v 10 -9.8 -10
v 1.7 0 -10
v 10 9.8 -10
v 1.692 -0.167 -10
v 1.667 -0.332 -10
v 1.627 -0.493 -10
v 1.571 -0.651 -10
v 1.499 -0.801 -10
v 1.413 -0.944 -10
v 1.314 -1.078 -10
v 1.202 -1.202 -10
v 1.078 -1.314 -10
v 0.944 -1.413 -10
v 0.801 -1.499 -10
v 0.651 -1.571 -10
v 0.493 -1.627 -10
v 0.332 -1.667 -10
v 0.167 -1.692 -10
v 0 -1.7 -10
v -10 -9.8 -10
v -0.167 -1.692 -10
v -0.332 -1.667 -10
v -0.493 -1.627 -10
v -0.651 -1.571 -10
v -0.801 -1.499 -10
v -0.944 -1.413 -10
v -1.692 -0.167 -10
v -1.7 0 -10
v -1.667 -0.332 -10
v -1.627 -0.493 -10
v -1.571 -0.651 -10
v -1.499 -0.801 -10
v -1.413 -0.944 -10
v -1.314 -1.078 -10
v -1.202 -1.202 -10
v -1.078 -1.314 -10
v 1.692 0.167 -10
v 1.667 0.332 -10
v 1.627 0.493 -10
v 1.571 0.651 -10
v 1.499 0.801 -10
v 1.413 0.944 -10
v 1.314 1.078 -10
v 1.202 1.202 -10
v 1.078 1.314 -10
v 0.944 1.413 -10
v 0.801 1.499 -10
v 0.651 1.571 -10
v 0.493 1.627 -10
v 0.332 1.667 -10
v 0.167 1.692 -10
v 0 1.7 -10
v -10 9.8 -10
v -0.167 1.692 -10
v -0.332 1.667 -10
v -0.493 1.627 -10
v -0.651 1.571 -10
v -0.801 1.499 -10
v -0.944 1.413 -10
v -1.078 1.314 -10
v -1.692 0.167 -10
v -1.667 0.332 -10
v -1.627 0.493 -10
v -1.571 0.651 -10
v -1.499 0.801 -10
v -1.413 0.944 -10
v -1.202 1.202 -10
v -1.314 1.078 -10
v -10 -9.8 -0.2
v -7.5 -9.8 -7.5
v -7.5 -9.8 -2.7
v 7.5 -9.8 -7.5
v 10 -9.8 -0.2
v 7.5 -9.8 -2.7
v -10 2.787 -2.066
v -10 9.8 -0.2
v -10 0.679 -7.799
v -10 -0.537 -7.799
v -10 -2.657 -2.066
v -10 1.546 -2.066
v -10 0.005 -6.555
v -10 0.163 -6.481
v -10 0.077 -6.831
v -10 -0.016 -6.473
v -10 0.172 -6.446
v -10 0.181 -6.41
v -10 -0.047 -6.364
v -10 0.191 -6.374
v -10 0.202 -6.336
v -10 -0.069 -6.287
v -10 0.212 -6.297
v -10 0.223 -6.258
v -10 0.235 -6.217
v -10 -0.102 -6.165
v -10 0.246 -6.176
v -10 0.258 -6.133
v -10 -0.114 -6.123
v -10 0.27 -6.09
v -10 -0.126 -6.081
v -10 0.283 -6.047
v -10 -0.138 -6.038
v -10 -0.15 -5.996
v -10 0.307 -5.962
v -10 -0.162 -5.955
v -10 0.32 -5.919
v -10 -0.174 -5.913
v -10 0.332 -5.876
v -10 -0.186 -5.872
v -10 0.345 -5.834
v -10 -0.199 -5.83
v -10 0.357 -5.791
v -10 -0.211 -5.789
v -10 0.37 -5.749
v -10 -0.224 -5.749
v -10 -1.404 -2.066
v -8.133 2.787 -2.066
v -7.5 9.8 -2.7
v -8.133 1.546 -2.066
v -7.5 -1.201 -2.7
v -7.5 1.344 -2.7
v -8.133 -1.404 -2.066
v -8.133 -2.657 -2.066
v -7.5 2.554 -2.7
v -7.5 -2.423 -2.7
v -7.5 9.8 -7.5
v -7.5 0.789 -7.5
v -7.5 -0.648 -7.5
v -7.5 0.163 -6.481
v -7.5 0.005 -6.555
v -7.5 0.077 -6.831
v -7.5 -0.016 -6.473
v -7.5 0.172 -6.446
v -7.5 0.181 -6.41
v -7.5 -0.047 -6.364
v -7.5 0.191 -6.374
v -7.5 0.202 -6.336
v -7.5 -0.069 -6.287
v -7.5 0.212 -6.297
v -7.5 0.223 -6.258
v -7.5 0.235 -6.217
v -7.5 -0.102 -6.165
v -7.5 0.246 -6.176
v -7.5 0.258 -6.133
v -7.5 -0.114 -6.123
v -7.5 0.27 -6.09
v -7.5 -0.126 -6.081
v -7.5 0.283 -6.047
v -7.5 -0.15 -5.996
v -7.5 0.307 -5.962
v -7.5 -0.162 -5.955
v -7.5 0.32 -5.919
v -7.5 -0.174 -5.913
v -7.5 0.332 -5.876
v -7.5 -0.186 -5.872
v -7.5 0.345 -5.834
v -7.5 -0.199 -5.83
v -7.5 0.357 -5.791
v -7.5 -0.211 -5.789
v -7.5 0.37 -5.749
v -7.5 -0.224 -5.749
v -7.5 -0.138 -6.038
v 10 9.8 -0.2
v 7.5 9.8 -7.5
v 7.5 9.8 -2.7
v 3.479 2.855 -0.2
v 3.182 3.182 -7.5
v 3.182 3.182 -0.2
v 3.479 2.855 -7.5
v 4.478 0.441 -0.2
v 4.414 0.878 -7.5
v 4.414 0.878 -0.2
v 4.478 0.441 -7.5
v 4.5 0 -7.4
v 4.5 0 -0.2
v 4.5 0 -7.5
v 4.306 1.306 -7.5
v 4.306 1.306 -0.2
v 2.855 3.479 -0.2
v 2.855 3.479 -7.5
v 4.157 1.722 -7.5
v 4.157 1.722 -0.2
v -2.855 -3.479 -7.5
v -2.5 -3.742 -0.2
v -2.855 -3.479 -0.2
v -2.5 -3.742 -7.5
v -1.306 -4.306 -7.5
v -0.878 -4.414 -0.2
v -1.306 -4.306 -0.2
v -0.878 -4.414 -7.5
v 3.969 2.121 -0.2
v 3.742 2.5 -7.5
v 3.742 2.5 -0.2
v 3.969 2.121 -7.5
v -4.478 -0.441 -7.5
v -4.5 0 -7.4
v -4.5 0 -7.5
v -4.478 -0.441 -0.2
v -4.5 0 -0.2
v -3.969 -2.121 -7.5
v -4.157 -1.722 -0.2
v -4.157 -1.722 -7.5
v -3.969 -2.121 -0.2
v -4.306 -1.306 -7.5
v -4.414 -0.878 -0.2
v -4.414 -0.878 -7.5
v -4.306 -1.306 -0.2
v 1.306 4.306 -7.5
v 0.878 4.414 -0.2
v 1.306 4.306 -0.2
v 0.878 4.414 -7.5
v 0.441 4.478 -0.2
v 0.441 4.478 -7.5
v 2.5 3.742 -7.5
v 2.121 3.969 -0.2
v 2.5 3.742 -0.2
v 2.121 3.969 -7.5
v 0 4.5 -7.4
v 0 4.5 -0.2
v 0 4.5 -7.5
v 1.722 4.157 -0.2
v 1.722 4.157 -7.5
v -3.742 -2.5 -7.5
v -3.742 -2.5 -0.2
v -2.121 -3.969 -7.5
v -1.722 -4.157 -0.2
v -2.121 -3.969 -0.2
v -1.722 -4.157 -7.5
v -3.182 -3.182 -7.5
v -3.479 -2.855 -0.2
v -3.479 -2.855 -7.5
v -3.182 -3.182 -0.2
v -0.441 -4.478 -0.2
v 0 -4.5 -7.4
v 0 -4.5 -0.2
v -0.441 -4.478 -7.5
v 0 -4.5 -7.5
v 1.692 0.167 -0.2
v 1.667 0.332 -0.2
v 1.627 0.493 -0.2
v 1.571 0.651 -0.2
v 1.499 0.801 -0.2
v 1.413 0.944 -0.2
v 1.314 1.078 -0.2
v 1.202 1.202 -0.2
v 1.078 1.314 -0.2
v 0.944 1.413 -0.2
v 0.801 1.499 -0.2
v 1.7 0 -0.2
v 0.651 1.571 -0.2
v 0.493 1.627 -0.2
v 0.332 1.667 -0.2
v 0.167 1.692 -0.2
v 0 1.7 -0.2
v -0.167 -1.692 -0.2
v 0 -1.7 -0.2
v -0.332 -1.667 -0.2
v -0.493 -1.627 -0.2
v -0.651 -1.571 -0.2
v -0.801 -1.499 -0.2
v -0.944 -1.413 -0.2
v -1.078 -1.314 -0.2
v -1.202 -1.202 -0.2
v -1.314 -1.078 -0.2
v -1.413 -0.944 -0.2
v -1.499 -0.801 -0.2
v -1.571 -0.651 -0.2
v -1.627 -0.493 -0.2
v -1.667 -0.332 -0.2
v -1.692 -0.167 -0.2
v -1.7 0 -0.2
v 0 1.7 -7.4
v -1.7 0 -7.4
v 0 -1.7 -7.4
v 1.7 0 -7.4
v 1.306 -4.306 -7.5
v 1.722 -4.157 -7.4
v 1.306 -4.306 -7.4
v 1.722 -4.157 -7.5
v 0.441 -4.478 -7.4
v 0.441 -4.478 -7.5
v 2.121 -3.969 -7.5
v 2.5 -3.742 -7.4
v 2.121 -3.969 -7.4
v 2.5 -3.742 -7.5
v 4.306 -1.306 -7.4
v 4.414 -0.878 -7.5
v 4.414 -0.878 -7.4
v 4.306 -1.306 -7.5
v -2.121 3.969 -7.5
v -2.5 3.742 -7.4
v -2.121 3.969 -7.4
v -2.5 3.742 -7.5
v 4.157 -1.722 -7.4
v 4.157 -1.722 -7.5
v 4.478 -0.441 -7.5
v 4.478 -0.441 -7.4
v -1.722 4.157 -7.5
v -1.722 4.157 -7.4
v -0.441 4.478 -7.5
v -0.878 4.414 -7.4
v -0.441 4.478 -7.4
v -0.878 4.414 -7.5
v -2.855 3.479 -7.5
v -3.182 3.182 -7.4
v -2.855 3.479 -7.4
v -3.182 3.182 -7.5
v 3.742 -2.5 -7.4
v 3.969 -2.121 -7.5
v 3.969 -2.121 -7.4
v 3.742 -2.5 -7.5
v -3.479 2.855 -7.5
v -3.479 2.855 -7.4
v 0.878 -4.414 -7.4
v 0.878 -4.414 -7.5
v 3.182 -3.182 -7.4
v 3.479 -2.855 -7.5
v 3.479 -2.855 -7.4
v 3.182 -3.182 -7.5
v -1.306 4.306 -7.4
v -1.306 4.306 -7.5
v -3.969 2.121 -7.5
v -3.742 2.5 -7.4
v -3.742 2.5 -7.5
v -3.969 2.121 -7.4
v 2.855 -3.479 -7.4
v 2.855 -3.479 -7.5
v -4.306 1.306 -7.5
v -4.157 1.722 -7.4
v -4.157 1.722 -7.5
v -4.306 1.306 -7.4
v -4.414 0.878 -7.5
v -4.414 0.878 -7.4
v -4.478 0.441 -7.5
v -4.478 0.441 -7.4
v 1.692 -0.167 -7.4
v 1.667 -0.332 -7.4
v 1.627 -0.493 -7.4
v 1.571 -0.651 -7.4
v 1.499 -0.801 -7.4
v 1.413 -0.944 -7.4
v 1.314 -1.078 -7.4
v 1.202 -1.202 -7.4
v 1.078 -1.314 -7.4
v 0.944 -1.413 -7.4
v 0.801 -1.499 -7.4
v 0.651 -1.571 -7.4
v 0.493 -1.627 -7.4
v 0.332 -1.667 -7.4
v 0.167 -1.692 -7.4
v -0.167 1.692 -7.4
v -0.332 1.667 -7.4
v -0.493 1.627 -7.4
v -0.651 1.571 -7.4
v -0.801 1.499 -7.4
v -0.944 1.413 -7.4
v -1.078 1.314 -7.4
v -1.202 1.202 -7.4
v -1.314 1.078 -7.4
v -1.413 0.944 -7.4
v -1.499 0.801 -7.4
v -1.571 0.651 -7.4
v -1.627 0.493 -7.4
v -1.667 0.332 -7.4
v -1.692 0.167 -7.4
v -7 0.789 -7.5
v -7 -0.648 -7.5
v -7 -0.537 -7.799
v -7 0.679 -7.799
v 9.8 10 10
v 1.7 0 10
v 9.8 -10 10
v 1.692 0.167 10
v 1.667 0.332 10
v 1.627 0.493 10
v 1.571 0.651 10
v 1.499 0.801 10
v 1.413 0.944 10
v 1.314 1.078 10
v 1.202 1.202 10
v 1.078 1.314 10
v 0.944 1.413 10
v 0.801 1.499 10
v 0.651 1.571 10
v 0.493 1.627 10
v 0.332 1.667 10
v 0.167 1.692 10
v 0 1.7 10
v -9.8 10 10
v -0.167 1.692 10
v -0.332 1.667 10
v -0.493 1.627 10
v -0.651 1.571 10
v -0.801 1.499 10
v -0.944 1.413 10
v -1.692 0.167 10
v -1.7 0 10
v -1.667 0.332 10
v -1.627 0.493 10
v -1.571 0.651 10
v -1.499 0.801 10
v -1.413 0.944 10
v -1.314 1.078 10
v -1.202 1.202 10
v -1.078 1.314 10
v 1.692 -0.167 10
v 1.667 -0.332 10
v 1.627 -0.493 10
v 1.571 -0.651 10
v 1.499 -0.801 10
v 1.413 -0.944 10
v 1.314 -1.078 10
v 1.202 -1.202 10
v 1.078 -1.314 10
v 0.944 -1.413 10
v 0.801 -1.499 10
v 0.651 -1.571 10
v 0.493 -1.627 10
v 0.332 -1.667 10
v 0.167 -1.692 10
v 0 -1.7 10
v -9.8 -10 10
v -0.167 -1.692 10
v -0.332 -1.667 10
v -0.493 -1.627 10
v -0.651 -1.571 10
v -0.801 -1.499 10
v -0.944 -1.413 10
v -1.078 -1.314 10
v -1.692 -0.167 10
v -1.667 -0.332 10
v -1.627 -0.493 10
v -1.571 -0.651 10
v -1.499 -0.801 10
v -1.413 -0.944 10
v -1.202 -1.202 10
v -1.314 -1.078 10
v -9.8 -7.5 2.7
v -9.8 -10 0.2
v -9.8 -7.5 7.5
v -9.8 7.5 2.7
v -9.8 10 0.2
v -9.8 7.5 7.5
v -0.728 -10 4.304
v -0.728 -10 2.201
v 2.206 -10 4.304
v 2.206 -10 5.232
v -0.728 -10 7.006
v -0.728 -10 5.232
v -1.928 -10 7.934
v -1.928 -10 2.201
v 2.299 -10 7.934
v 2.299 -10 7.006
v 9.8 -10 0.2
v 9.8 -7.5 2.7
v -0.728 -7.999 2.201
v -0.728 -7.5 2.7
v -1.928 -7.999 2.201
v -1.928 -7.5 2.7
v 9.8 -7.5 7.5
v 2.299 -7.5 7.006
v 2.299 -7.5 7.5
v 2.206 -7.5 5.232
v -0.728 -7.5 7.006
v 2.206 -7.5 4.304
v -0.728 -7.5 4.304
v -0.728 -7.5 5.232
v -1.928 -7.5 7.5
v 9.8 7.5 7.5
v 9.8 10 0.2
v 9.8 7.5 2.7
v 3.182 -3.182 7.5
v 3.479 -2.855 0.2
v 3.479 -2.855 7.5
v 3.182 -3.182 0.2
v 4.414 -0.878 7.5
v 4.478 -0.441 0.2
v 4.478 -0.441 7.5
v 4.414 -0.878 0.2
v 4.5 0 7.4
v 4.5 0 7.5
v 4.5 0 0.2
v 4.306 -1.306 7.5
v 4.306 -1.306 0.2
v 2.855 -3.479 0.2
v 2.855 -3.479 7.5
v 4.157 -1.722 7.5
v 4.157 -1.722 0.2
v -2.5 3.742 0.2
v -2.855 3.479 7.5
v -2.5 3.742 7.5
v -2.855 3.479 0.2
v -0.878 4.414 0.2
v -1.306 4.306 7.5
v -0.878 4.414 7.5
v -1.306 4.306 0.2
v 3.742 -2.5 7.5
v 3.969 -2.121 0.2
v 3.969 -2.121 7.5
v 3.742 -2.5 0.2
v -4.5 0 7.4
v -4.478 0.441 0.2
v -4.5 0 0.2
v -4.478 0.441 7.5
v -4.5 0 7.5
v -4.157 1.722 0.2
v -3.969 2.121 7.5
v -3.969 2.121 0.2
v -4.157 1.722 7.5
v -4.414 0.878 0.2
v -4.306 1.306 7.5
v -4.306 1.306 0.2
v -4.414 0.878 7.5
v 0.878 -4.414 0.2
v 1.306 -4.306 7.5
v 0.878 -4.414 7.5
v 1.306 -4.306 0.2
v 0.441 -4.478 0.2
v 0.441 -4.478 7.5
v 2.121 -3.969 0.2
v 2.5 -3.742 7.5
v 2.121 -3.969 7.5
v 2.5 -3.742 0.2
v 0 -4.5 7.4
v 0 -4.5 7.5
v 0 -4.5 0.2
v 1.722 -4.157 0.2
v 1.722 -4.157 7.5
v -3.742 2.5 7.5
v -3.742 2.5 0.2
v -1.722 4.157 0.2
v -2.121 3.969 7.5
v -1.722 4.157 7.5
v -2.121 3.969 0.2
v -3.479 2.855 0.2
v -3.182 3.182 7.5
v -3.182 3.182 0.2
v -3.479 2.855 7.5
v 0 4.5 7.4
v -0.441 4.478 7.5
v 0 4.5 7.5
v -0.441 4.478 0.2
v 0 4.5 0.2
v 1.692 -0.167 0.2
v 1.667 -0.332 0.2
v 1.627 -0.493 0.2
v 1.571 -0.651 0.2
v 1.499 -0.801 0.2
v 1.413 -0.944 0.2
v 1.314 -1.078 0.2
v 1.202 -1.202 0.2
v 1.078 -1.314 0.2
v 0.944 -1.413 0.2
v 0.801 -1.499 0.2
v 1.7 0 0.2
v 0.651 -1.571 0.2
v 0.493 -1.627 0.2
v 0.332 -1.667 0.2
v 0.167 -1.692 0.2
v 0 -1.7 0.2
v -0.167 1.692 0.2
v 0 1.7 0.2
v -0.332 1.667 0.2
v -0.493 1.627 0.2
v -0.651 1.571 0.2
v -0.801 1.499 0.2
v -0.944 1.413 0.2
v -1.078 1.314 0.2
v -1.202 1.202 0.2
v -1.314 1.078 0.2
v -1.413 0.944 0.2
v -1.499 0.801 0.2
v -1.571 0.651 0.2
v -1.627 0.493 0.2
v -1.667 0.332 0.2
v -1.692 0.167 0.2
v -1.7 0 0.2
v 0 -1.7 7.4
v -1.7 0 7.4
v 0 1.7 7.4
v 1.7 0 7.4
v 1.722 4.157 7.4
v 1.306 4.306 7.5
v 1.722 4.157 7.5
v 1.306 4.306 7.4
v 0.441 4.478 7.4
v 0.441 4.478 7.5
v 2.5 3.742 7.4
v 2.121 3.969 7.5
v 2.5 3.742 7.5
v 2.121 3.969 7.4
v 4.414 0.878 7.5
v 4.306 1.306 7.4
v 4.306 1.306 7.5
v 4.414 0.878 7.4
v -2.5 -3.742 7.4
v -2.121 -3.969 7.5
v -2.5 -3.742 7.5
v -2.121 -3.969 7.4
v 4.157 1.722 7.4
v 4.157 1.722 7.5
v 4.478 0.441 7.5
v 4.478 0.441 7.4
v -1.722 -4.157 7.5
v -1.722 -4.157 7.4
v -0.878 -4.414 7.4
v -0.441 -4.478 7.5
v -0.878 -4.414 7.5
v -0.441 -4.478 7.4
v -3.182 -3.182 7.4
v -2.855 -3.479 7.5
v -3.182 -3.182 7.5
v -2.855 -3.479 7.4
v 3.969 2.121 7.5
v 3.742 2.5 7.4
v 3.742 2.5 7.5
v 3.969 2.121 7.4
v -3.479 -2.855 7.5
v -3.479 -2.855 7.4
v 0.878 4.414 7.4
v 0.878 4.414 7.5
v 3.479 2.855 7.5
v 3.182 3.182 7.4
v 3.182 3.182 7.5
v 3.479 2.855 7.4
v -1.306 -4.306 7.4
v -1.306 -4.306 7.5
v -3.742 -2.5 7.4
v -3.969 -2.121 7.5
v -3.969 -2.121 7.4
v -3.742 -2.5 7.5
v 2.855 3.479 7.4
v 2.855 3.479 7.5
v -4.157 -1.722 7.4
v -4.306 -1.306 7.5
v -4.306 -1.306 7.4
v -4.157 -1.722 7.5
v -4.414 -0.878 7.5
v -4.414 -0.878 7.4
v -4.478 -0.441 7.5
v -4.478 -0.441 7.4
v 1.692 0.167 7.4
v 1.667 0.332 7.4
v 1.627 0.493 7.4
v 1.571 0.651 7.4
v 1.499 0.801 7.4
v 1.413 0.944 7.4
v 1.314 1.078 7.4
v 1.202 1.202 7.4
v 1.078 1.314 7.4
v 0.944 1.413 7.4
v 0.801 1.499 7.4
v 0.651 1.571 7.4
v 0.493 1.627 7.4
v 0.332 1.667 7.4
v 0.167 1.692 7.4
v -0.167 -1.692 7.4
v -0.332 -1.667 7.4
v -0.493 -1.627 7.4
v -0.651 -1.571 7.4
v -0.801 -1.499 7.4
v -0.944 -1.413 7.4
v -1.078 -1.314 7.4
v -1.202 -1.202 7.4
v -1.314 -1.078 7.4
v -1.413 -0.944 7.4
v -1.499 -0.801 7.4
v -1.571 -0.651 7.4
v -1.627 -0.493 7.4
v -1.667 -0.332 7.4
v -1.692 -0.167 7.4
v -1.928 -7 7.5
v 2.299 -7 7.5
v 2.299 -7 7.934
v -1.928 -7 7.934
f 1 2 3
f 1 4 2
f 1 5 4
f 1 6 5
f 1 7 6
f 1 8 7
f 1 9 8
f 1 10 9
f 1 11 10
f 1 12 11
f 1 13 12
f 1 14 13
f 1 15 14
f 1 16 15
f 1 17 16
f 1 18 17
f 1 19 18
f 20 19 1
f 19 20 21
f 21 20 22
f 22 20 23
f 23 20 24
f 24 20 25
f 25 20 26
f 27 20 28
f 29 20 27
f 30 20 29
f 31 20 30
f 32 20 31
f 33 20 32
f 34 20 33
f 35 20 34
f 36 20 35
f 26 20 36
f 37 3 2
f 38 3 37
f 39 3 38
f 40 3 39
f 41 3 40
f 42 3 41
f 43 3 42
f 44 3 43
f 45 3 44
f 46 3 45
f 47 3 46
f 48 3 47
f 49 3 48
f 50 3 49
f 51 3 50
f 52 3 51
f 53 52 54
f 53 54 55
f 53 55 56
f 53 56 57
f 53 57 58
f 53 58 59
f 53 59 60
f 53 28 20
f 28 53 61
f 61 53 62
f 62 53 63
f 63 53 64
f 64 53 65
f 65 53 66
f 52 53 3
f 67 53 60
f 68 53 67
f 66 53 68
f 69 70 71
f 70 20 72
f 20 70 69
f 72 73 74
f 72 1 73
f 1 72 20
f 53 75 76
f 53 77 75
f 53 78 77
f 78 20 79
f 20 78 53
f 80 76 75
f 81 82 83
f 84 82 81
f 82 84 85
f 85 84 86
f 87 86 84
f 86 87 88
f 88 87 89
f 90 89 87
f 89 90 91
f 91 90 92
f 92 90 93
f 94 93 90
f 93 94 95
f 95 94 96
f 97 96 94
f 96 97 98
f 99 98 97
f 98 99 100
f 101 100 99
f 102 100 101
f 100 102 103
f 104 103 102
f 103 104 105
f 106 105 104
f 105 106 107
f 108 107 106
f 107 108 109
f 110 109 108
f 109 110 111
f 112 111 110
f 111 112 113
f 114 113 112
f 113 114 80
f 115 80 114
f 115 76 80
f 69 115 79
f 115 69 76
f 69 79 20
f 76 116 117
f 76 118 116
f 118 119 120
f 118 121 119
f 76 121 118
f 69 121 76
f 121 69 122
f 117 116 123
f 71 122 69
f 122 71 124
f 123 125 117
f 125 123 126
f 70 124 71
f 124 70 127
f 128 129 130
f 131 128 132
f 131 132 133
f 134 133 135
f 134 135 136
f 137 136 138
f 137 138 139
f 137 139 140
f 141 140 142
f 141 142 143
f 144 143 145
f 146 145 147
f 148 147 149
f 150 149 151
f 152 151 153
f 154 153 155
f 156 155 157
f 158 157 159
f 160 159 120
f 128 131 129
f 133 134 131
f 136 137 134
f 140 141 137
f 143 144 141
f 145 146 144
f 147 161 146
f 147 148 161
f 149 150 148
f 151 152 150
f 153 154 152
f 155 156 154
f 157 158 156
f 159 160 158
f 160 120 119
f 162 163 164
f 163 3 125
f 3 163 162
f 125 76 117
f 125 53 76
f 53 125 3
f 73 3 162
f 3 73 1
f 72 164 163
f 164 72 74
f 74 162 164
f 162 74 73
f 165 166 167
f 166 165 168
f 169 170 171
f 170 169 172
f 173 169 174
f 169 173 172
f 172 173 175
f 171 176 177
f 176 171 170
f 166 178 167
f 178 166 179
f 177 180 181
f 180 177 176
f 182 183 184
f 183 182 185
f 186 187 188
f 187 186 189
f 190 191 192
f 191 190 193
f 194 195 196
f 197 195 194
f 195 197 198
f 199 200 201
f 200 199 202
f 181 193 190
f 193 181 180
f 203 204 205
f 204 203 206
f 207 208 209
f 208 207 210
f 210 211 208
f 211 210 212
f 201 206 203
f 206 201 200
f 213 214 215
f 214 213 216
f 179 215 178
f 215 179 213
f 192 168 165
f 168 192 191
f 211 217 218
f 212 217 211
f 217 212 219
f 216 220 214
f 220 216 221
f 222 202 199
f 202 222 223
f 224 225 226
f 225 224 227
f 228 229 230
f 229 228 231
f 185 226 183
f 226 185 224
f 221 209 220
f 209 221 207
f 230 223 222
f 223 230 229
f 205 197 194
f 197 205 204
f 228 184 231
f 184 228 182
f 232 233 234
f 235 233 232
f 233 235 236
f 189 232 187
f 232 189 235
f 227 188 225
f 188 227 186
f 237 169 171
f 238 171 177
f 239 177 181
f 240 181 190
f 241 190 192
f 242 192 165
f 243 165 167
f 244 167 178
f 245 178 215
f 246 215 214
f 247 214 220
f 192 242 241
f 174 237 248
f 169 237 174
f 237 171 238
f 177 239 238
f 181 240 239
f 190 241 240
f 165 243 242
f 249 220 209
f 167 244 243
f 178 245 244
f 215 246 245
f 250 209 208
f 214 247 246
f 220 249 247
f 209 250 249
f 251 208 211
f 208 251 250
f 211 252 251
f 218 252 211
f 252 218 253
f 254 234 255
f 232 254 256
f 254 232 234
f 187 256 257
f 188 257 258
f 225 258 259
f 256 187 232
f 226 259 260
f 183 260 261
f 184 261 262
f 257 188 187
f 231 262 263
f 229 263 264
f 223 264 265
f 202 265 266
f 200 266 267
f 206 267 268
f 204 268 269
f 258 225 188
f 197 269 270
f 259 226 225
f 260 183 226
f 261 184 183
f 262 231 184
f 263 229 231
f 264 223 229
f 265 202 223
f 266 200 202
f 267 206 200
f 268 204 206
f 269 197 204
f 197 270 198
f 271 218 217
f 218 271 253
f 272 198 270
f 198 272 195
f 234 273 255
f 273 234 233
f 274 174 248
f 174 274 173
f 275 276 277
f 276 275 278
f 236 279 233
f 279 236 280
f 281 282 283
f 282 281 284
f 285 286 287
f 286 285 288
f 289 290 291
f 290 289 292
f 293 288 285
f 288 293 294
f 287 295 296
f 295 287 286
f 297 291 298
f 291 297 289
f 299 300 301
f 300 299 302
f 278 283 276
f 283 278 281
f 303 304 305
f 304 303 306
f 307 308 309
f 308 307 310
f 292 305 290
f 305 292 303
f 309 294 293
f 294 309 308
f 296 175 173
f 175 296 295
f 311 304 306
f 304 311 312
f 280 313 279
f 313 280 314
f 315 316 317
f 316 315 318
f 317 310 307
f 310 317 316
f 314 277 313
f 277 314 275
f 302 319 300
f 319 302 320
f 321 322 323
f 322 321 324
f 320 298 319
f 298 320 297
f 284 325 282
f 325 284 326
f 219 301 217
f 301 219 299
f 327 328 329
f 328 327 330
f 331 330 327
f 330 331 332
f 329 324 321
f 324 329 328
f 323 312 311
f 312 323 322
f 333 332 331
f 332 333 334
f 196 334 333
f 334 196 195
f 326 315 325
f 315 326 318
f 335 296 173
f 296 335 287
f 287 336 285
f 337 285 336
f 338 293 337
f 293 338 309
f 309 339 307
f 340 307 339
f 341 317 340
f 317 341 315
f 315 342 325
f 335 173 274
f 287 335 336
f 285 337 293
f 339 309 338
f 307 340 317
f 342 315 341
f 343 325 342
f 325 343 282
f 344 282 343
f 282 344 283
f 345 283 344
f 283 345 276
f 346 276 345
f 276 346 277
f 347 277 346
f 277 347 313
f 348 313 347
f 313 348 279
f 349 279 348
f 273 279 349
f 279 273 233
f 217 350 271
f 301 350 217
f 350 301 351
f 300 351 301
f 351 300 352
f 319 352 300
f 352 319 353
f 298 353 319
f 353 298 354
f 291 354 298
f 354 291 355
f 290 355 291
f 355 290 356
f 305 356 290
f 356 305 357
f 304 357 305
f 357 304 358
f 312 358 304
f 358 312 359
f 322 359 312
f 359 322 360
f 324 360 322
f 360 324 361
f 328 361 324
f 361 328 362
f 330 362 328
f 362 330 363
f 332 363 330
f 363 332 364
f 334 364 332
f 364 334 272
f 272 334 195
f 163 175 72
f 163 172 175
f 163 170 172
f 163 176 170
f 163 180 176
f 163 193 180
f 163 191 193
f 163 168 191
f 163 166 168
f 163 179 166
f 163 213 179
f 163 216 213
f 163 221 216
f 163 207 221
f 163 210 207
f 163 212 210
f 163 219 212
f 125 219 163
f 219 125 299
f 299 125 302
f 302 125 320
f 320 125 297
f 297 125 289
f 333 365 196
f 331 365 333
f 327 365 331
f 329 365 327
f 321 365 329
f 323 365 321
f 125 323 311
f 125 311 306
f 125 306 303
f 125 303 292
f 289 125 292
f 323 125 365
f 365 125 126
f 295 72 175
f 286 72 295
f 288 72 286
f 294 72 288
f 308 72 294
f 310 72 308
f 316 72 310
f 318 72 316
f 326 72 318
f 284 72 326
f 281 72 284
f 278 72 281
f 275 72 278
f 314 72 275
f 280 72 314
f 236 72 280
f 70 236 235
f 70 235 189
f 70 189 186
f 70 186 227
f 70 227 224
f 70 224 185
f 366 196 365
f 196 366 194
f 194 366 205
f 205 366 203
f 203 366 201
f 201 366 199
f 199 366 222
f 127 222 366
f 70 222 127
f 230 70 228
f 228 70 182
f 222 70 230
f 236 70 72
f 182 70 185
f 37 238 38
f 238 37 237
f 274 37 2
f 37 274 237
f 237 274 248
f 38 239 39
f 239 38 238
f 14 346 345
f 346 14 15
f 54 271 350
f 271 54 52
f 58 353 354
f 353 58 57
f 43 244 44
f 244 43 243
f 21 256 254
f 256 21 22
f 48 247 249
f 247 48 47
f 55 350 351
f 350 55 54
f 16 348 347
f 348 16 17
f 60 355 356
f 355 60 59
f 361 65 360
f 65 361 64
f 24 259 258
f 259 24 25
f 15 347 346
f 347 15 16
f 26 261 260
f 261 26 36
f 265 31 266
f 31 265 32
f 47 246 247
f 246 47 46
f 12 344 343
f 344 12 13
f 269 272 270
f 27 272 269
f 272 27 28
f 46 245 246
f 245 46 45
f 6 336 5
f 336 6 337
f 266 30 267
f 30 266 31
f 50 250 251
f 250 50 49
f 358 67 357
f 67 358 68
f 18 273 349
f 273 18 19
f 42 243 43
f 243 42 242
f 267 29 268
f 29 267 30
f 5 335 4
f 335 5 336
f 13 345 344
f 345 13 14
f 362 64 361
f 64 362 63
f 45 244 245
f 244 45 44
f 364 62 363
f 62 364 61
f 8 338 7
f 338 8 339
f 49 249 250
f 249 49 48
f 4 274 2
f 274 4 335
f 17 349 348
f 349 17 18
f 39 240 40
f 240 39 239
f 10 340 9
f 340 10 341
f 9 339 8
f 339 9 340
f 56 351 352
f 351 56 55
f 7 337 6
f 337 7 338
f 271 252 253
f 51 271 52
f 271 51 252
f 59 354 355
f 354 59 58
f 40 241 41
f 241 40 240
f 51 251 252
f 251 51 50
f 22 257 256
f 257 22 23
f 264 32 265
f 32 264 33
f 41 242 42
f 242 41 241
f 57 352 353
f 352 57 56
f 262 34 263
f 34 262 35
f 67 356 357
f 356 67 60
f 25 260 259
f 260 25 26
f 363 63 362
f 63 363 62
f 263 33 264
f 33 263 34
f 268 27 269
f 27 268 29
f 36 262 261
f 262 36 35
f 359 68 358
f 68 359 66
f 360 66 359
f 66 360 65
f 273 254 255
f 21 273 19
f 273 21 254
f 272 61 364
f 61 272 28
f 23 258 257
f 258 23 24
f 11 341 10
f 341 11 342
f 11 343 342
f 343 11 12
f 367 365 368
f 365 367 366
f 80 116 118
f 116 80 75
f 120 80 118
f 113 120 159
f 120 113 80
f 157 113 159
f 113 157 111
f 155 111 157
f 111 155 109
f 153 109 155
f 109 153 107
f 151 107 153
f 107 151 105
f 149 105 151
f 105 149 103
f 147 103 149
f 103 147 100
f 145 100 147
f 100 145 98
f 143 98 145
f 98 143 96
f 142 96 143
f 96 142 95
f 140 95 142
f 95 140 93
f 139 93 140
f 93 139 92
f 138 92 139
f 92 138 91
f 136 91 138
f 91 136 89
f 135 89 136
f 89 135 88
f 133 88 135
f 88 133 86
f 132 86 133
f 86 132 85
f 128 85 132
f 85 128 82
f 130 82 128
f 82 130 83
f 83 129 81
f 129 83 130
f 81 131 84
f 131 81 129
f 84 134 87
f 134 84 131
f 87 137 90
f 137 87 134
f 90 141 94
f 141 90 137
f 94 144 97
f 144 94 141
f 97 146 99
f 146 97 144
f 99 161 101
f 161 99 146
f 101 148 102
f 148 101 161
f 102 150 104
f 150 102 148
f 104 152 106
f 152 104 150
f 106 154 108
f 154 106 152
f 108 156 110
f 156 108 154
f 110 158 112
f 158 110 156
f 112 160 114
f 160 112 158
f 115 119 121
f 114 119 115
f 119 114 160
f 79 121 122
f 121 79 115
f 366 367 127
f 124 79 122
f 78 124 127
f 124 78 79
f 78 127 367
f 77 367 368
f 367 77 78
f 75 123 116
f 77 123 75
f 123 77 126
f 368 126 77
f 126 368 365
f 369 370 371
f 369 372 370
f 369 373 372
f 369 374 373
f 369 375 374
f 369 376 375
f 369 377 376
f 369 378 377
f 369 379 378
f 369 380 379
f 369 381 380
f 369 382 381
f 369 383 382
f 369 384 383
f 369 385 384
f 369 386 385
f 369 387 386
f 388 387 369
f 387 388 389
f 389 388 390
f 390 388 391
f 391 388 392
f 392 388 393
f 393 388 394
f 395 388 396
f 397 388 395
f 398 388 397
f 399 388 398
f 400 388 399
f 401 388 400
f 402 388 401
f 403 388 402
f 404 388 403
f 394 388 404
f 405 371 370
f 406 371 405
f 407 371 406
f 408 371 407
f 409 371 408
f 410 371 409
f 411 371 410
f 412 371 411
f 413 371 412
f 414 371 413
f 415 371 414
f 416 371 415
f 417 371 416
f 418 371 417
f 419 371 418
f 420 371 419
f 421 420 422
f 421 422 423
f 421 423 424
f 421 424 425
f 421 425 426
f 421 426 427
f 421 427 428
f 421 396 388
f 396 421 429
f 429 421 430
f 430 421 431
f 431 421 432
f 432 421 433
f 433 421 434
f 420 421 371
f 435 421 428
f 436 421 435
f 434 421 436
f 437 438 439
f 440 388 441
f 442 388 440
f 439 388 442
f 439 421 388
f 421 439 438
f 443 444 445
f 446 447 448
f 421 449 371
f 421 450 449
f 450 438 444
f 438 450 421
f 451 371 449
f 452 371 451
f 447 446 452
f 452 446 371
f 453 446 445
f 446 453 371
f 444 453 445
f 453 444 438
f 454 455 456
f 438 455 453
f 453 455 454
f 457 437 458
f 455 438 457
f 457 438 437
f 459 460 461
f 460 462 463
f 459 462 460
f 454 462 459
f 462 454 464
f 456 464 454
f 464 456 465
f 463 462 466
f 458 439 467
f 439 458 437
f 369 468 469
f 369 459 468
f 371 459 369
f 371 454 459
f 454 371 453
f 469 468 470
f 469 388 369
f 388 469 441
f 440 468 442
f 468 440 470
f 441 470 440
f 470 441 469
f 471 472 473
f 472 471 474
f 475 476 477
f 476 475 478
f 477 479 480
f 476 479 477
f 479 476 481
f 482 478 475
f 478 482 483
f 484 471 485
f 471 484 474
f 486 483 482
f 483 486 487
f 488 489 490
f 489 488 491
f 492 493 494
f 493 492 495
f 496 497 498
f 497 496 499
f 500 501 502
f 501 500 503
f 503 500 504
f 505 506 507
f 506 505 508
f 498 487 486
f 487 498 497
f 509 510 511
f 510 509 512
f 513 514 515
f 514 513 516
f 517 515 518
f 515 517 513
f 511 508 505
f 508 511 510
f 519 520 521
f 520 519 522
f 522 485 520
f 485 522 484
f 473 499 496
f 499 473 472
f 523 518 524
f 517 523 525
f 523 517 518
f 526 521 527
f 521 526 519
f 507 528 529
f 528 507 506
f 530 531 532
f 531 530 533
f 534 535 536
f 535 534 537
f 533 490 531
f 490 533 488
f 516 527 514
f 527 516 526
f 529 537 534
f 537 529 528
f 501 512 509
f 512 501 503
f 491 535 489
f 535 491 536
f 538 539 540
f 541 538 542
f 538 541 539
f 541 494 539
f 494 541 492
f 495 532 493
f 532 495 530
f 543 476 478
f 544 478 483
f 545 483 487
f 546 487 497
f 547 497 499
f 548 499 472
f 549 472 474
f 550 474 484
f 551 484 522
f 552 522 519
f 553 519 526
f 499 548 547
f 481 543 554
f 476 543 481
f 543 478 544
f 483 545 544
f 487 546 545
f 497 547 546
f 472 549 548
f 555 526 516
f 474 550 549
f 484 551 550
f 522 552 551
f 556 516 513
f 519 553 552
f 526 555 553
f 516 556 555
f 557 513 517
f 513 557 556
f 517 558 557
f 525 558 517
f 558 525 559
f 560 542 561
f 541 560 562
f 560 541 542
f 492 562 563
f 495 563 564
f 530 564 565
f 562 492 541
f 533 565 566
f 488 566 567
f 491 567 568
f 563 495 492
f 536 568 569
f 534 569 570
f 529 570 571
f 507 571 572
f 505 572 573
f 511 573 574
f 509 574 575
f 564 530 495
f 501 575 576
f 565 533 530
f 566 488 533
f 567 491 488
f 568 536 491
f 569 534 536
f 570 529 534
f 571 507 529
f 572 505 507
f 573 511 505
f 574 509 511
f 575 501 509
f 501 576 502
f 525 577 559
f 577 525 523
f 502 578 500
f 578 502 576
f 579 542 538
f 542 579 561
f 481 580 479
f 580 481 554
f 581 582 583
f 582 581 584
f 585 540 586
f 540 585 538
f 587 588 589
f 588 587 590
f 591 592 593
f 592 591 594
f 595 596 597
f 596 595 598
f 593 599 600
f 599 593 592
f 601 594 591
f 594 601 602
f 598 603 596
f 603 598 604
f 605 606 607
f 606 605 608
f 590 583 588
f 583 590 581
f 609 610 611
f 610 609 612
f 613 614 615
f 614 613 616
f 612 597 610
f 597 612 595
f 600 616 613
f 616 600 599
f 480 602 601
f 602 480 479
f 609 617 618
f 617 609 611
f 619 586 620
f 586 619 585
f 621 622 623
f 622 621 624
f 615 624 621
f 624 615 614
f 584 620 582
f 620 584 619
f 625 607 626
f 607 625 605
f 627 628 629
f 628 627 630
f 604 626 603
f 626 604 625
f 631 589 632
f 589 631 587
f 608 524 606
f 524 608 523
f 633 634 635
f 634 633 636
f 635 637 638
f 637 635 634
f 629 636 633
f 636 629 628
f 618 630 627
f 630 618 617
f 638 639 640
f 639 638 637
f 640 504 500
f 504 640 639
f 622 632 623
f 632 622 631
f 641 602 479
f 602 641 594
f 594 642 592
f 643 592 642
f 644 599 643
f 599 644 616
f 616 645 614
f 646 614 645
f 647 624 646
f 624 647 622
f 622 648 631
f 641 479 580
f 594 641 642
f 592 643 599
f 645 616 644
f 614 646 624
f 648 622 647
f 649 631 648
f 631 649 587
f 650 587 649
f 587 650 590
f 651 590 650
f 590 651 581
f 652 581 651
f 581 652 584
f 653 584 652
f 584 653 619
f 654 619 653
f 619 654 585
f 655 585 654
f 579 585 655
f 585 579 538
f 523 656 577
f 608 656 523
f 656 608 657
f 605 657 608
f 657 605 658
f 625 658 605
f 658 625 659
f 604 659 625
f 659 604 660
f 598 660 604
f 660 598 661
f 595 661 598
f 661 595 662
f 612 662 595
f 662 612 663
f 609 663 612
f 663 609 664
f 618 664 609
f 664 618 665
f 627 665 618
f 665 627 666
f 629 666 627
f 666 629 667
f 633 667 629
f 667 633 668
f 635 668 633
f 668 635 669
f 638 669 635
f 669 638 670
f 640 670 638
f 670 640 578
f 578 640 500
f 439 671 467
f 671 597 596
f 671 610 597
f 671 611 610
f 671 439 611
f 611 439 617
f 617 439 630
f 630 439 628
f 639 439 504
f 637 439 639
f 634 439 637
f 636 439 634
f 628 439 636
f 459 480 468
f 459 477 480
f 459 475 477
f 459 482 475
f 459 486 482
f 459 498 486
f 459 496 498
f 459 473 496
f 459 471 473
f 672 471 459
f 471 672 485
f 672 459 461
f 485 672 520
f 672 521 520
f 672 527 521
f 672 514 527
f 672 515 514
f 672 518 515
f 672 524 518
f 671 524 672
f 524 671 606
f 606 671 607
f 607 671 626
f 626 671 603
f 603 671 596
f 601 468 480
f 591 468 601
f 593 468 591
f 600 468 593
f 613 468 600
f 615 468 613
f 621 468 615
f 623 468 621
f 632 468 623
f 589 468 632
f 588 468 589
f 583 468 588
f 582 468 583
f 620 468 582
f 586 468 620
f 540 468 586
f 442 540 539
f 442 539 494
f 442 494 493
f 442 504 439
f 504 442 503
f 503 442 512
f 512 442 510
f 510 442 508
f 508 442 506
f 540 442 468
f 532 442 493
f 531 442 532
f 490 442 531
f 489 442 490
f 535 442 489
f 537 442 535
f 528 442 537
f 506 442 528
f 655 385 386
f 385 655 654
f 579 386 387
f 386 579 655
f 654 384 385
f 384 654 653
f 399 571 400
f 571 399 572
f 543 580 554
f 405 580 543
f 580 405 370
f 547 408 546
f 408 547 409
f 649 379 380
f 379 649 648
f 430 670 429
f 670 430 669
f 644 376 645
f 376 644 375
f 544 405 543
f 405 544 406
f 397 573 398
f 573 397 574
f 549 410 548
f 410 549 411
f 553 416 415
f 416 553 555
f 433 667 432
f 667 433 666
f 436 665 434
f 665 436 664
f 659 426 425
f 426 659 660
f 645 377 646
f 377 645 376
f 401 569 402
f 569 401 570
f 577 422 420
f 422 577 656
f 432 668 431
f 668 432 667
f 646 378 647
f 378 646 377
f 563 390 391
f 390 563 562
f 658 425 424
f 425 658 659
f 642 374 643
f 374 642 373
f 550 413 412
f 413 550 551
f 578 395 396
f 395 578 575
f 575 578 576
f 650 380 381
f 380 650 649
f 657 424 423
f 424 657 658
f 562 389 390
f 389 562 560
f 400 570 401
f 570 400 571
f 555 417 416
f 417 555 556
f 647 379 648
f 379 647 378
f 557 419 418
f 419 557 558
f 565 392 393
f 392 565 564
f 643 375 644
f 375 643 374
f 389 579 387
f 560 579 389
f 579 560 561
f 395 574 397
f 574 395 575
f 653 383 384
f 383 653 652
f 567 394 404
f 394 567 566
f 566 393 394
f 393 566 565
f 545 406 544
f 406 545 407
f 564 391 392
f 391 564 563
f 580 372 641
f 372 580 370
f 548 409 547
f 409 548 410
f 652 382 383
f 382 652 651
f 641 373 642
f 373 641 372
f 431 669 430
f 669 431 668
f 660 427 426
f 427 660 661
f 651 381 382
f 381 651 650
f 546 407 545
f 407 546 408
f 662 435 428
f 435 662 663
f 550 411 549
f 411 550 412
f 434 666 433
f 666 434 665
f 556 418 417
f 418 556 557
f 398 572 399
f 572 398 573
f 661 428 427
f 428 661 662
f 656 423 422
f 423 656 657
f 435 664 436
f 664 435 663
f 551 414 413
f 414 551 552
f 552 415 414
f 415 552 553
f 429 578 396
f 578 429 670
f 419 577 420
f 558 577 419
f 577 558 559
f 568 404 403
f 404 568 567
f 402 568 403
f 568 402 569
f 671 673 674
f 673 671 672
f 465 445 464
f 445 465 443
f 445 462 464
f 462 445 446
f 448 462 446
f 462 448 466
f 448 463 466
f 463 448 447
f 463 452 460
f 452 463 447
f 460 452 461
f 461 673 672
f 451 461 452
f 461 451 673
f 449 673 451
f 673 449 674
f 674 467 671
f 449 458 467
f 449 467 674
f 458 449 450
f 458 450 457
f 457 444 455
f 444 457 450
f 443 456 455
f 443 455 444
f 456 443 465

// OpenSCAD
// file: half_cube.scad
// half_cube.scad - Simplified Parametric Half-Cube
// Designed for verification: single volume, watertight, no collision
// Units: mm

$fn = 64;

// --- Parameters ---
size = 20.0;          // Outer cube dimension
thick = 2.5;          // Wall thickness
rod_D = 3.0;          // Rod diameter
clearance = 0.2;      // Clearance for rod bore
fit_clear = 0.2;      // Miter face clearance (increased per research)

// --- Visibility Toggles ---
show_base = true;
show_walls = true;
show_mech = true;
show_letter = true;

// --- Flip Mode (for top unit) ---
is_flipped = false;        // true = top unit (rotated mechanism, inverted letter)

// --- Letter Parameters ---
letter = is_flipped ? "F" : "V";  // Default: V for bottom, F for top
letter_emboss = false;     // true = raised, false = carved
letter_depth = 0.5;        // Depth/height of letter (mm)
letter_size = 6;           // Font size (mm)

// Derived
cyl_R = 4.5;          // Mechanism cylinder radius
cyl_H = size/2 - thick - fit_clear; // Height from base top to part top

// --- Main Assembly ---
module assembly(flipped=is_flipped) {
    difference() {
        union() {
            // 1. Base Plate (bottom of U-channel)
            if (show_base)
                translate([0, 0, -size/2 + thick/2])
                    base_plate();
            
            // 2. Side Walls with mitered edges
            if (show_walls) {
                translate([-size/2 + thick/2, 0, 0])
                    mitered_wall();
                translate([size/2 - thick/2, 0, 0])
                    mirror([1,0,0]) mitered_wall();
            }
            
            // 3. Central mechanism pillars
            // Position at base plate bottom (z=-10) so base_ring spans through base
            if (show_mech)
                translate([0, 0, -size/2])  // Start at very bottom of part
                    mechanism_pillars(flipped=flipped);
            
            // 4. Letter (embossed mode - raised)
            if (show_letter && letter_emboss)
                letter_geometry(flipped=flipped);
        }
        
        // Global subtractions
        // Rod bore through center
        cylinder(r=rod_D/2 + clearance, h=size*2, center=true);
        
        // Letter (carved mode - recessed)
        if (show_letter && !letter_emboss)
            letter_geometry(flipped=flipped);
    }
}

// --- Base Plate ---
// Full width in X and Y, with trapezoid profile in Y-Z
module base_plate() {
    // Simple rectangular base that spans full width
    // The Y dimension must go edge to edge (minus clearance)
    cube([size - 2*fit_clear, size - 2*fit_clear, thick], center=true);
}

// --- Mitered Wall ---
// Wall with 45° chamfer only on top for mating interface
// Wall only spans HALF the cube (from base to midpoint)
module mitered_wall() {
    // The wall needs to span: 
    //   X = thick (wall thickness)
    //   Y = size (full cube width, minus clearance)
    //   Z = half cube height (from -size/2 to -fit_clear)
    
    wall_length = size - 2*fit_clear;  // Y dimension
    
    // Rotate the extrusion so it extends along Y instead of Z
    rotate([90, 0, 0])  // Rotate -90° around X to point extrusion in -Y (then center=true makes it +/-Y)
    linear_extrude(wall_length, center=true)  // This now extrudes along Y
        // Polygon in XZ plane (after rotation, this becomes the actual XZ plane of the wall)
        polygon([
            [-thick/2, -size/2],             // Bottom-outer (z=-10)
            [-thick/2, -fit_clear],          // Top-outer (z=-0.2)
            [thick/2, -thick - fit_clear],   // Top-inner (z=-2.7, chamfered)
            [thick/2, -size/2]               // Bottom-inner (z=-10)
        ]);
}

// --- Letter Geometry ---
// Places letter on left wall exterior
// Flipped 180° for top unit so it reads correctly after assembly
module letter_geometry(flipped=is_flipped) {
    // Position on left wall exterior face
    wall_x = -size/2;  // Left wall position
    letter_z = -size/4;  // Center of wall height
    
    // Determine letter and rotation based on local flipped state
    local_letter = flipped ? "F" : "V";
    
    // Rotation: 90° to face outward from wall
    // When flipped: add 180° so letter reads correctly after assembly flip
    flip_angle = flipped ? 180 : 0;
    
    translate([wall_x, 0, letter_z])
        rotate([90, flip_angle, 90]) { // Face outward (-X direction)
            // Counter-mirror for flipped unit to ensure text reads Left-to-Right
            scale([flipped ? -1 : 1, 1, 1])
            
            linear_extrude(letter_depth + (letter_emboss ? 0 : thick))
                text(local_letter, size=letter_size, halign="center", valign="center", 
                     font="Liberation Sans:style=Bold");
}
}

// --- Mechanism Pillars ---
// Two opposing quadrant pillars with a solid base ring
// Bottom unit: pillars at 0°/180°, cuts at 90°/270°
// Flipped unit: pillars at 90°/270°, cuts at 0°/180° (rotated 90°)
module mechanism_pillars(flipped=is_flipped) {
    base_ring_h = thick + 0.1;  // Height of solid ring = base plate thickness + overlap
    pillar_height = cyl_H;
    
    // Rotate entire mechanism 90° for flipped (top) unit
    mech_rotation = flipped ? 90 : 0;
    
    rotate([0, 0, mech_rotation])
    union() {
        // 1. Solid base ring (no wedge cuts) - this connects to base plate
        cylinder(r=cyl_R, h=base_ring_h);
        
        // 2. Pillars above the base ring (with wedge cuts)
        translate([0, 0, base_ring_h - 0.1])  // Small overlap for solid union
            difference() {
                cylinder(r=cyl_R, h=pillar_height);
                
                // Cut away two opposing quadrants (90° and 270°)
                rotate([0, 0, 90])
                    wedge_cutter(pillar_height + 1);
                rotate([0, 0, 270])
                    wedge_cutter(pillar_height + 1);
            }
    }
}

// Wedge cutter for 90° sector
module wedge_cutter(h=size) {
    linear_extrude(h)
        polygon([[0, 0], [size, 0], [0, size]]);
}

// --- Render ---
// Only render if not included as library
if (is_undef(is_library)) {
    assembly();
}
// main file
// Suppress default render in half_cube
is_library = 1;
include <half_cube.scad>

// --- Parameters ---
// Inherits size, thick, rod_D from half_cube via command line

render_mode = 0; // 0=all, 1=bottom, 2=top

// --- Main Assembly ---
// A single interlocking cube (two half-cubes)

// Part A: Right-side up (Bottom Unit)
if (render_mode == 0 || render_mode == 1)
    assembly();

// Part B: Upside down and Rotated 90 (Top Unit)
if (render_mode == 0 || render_mode == 2)
    rotate([180, 0, 90]) assembly(flipped=true);
